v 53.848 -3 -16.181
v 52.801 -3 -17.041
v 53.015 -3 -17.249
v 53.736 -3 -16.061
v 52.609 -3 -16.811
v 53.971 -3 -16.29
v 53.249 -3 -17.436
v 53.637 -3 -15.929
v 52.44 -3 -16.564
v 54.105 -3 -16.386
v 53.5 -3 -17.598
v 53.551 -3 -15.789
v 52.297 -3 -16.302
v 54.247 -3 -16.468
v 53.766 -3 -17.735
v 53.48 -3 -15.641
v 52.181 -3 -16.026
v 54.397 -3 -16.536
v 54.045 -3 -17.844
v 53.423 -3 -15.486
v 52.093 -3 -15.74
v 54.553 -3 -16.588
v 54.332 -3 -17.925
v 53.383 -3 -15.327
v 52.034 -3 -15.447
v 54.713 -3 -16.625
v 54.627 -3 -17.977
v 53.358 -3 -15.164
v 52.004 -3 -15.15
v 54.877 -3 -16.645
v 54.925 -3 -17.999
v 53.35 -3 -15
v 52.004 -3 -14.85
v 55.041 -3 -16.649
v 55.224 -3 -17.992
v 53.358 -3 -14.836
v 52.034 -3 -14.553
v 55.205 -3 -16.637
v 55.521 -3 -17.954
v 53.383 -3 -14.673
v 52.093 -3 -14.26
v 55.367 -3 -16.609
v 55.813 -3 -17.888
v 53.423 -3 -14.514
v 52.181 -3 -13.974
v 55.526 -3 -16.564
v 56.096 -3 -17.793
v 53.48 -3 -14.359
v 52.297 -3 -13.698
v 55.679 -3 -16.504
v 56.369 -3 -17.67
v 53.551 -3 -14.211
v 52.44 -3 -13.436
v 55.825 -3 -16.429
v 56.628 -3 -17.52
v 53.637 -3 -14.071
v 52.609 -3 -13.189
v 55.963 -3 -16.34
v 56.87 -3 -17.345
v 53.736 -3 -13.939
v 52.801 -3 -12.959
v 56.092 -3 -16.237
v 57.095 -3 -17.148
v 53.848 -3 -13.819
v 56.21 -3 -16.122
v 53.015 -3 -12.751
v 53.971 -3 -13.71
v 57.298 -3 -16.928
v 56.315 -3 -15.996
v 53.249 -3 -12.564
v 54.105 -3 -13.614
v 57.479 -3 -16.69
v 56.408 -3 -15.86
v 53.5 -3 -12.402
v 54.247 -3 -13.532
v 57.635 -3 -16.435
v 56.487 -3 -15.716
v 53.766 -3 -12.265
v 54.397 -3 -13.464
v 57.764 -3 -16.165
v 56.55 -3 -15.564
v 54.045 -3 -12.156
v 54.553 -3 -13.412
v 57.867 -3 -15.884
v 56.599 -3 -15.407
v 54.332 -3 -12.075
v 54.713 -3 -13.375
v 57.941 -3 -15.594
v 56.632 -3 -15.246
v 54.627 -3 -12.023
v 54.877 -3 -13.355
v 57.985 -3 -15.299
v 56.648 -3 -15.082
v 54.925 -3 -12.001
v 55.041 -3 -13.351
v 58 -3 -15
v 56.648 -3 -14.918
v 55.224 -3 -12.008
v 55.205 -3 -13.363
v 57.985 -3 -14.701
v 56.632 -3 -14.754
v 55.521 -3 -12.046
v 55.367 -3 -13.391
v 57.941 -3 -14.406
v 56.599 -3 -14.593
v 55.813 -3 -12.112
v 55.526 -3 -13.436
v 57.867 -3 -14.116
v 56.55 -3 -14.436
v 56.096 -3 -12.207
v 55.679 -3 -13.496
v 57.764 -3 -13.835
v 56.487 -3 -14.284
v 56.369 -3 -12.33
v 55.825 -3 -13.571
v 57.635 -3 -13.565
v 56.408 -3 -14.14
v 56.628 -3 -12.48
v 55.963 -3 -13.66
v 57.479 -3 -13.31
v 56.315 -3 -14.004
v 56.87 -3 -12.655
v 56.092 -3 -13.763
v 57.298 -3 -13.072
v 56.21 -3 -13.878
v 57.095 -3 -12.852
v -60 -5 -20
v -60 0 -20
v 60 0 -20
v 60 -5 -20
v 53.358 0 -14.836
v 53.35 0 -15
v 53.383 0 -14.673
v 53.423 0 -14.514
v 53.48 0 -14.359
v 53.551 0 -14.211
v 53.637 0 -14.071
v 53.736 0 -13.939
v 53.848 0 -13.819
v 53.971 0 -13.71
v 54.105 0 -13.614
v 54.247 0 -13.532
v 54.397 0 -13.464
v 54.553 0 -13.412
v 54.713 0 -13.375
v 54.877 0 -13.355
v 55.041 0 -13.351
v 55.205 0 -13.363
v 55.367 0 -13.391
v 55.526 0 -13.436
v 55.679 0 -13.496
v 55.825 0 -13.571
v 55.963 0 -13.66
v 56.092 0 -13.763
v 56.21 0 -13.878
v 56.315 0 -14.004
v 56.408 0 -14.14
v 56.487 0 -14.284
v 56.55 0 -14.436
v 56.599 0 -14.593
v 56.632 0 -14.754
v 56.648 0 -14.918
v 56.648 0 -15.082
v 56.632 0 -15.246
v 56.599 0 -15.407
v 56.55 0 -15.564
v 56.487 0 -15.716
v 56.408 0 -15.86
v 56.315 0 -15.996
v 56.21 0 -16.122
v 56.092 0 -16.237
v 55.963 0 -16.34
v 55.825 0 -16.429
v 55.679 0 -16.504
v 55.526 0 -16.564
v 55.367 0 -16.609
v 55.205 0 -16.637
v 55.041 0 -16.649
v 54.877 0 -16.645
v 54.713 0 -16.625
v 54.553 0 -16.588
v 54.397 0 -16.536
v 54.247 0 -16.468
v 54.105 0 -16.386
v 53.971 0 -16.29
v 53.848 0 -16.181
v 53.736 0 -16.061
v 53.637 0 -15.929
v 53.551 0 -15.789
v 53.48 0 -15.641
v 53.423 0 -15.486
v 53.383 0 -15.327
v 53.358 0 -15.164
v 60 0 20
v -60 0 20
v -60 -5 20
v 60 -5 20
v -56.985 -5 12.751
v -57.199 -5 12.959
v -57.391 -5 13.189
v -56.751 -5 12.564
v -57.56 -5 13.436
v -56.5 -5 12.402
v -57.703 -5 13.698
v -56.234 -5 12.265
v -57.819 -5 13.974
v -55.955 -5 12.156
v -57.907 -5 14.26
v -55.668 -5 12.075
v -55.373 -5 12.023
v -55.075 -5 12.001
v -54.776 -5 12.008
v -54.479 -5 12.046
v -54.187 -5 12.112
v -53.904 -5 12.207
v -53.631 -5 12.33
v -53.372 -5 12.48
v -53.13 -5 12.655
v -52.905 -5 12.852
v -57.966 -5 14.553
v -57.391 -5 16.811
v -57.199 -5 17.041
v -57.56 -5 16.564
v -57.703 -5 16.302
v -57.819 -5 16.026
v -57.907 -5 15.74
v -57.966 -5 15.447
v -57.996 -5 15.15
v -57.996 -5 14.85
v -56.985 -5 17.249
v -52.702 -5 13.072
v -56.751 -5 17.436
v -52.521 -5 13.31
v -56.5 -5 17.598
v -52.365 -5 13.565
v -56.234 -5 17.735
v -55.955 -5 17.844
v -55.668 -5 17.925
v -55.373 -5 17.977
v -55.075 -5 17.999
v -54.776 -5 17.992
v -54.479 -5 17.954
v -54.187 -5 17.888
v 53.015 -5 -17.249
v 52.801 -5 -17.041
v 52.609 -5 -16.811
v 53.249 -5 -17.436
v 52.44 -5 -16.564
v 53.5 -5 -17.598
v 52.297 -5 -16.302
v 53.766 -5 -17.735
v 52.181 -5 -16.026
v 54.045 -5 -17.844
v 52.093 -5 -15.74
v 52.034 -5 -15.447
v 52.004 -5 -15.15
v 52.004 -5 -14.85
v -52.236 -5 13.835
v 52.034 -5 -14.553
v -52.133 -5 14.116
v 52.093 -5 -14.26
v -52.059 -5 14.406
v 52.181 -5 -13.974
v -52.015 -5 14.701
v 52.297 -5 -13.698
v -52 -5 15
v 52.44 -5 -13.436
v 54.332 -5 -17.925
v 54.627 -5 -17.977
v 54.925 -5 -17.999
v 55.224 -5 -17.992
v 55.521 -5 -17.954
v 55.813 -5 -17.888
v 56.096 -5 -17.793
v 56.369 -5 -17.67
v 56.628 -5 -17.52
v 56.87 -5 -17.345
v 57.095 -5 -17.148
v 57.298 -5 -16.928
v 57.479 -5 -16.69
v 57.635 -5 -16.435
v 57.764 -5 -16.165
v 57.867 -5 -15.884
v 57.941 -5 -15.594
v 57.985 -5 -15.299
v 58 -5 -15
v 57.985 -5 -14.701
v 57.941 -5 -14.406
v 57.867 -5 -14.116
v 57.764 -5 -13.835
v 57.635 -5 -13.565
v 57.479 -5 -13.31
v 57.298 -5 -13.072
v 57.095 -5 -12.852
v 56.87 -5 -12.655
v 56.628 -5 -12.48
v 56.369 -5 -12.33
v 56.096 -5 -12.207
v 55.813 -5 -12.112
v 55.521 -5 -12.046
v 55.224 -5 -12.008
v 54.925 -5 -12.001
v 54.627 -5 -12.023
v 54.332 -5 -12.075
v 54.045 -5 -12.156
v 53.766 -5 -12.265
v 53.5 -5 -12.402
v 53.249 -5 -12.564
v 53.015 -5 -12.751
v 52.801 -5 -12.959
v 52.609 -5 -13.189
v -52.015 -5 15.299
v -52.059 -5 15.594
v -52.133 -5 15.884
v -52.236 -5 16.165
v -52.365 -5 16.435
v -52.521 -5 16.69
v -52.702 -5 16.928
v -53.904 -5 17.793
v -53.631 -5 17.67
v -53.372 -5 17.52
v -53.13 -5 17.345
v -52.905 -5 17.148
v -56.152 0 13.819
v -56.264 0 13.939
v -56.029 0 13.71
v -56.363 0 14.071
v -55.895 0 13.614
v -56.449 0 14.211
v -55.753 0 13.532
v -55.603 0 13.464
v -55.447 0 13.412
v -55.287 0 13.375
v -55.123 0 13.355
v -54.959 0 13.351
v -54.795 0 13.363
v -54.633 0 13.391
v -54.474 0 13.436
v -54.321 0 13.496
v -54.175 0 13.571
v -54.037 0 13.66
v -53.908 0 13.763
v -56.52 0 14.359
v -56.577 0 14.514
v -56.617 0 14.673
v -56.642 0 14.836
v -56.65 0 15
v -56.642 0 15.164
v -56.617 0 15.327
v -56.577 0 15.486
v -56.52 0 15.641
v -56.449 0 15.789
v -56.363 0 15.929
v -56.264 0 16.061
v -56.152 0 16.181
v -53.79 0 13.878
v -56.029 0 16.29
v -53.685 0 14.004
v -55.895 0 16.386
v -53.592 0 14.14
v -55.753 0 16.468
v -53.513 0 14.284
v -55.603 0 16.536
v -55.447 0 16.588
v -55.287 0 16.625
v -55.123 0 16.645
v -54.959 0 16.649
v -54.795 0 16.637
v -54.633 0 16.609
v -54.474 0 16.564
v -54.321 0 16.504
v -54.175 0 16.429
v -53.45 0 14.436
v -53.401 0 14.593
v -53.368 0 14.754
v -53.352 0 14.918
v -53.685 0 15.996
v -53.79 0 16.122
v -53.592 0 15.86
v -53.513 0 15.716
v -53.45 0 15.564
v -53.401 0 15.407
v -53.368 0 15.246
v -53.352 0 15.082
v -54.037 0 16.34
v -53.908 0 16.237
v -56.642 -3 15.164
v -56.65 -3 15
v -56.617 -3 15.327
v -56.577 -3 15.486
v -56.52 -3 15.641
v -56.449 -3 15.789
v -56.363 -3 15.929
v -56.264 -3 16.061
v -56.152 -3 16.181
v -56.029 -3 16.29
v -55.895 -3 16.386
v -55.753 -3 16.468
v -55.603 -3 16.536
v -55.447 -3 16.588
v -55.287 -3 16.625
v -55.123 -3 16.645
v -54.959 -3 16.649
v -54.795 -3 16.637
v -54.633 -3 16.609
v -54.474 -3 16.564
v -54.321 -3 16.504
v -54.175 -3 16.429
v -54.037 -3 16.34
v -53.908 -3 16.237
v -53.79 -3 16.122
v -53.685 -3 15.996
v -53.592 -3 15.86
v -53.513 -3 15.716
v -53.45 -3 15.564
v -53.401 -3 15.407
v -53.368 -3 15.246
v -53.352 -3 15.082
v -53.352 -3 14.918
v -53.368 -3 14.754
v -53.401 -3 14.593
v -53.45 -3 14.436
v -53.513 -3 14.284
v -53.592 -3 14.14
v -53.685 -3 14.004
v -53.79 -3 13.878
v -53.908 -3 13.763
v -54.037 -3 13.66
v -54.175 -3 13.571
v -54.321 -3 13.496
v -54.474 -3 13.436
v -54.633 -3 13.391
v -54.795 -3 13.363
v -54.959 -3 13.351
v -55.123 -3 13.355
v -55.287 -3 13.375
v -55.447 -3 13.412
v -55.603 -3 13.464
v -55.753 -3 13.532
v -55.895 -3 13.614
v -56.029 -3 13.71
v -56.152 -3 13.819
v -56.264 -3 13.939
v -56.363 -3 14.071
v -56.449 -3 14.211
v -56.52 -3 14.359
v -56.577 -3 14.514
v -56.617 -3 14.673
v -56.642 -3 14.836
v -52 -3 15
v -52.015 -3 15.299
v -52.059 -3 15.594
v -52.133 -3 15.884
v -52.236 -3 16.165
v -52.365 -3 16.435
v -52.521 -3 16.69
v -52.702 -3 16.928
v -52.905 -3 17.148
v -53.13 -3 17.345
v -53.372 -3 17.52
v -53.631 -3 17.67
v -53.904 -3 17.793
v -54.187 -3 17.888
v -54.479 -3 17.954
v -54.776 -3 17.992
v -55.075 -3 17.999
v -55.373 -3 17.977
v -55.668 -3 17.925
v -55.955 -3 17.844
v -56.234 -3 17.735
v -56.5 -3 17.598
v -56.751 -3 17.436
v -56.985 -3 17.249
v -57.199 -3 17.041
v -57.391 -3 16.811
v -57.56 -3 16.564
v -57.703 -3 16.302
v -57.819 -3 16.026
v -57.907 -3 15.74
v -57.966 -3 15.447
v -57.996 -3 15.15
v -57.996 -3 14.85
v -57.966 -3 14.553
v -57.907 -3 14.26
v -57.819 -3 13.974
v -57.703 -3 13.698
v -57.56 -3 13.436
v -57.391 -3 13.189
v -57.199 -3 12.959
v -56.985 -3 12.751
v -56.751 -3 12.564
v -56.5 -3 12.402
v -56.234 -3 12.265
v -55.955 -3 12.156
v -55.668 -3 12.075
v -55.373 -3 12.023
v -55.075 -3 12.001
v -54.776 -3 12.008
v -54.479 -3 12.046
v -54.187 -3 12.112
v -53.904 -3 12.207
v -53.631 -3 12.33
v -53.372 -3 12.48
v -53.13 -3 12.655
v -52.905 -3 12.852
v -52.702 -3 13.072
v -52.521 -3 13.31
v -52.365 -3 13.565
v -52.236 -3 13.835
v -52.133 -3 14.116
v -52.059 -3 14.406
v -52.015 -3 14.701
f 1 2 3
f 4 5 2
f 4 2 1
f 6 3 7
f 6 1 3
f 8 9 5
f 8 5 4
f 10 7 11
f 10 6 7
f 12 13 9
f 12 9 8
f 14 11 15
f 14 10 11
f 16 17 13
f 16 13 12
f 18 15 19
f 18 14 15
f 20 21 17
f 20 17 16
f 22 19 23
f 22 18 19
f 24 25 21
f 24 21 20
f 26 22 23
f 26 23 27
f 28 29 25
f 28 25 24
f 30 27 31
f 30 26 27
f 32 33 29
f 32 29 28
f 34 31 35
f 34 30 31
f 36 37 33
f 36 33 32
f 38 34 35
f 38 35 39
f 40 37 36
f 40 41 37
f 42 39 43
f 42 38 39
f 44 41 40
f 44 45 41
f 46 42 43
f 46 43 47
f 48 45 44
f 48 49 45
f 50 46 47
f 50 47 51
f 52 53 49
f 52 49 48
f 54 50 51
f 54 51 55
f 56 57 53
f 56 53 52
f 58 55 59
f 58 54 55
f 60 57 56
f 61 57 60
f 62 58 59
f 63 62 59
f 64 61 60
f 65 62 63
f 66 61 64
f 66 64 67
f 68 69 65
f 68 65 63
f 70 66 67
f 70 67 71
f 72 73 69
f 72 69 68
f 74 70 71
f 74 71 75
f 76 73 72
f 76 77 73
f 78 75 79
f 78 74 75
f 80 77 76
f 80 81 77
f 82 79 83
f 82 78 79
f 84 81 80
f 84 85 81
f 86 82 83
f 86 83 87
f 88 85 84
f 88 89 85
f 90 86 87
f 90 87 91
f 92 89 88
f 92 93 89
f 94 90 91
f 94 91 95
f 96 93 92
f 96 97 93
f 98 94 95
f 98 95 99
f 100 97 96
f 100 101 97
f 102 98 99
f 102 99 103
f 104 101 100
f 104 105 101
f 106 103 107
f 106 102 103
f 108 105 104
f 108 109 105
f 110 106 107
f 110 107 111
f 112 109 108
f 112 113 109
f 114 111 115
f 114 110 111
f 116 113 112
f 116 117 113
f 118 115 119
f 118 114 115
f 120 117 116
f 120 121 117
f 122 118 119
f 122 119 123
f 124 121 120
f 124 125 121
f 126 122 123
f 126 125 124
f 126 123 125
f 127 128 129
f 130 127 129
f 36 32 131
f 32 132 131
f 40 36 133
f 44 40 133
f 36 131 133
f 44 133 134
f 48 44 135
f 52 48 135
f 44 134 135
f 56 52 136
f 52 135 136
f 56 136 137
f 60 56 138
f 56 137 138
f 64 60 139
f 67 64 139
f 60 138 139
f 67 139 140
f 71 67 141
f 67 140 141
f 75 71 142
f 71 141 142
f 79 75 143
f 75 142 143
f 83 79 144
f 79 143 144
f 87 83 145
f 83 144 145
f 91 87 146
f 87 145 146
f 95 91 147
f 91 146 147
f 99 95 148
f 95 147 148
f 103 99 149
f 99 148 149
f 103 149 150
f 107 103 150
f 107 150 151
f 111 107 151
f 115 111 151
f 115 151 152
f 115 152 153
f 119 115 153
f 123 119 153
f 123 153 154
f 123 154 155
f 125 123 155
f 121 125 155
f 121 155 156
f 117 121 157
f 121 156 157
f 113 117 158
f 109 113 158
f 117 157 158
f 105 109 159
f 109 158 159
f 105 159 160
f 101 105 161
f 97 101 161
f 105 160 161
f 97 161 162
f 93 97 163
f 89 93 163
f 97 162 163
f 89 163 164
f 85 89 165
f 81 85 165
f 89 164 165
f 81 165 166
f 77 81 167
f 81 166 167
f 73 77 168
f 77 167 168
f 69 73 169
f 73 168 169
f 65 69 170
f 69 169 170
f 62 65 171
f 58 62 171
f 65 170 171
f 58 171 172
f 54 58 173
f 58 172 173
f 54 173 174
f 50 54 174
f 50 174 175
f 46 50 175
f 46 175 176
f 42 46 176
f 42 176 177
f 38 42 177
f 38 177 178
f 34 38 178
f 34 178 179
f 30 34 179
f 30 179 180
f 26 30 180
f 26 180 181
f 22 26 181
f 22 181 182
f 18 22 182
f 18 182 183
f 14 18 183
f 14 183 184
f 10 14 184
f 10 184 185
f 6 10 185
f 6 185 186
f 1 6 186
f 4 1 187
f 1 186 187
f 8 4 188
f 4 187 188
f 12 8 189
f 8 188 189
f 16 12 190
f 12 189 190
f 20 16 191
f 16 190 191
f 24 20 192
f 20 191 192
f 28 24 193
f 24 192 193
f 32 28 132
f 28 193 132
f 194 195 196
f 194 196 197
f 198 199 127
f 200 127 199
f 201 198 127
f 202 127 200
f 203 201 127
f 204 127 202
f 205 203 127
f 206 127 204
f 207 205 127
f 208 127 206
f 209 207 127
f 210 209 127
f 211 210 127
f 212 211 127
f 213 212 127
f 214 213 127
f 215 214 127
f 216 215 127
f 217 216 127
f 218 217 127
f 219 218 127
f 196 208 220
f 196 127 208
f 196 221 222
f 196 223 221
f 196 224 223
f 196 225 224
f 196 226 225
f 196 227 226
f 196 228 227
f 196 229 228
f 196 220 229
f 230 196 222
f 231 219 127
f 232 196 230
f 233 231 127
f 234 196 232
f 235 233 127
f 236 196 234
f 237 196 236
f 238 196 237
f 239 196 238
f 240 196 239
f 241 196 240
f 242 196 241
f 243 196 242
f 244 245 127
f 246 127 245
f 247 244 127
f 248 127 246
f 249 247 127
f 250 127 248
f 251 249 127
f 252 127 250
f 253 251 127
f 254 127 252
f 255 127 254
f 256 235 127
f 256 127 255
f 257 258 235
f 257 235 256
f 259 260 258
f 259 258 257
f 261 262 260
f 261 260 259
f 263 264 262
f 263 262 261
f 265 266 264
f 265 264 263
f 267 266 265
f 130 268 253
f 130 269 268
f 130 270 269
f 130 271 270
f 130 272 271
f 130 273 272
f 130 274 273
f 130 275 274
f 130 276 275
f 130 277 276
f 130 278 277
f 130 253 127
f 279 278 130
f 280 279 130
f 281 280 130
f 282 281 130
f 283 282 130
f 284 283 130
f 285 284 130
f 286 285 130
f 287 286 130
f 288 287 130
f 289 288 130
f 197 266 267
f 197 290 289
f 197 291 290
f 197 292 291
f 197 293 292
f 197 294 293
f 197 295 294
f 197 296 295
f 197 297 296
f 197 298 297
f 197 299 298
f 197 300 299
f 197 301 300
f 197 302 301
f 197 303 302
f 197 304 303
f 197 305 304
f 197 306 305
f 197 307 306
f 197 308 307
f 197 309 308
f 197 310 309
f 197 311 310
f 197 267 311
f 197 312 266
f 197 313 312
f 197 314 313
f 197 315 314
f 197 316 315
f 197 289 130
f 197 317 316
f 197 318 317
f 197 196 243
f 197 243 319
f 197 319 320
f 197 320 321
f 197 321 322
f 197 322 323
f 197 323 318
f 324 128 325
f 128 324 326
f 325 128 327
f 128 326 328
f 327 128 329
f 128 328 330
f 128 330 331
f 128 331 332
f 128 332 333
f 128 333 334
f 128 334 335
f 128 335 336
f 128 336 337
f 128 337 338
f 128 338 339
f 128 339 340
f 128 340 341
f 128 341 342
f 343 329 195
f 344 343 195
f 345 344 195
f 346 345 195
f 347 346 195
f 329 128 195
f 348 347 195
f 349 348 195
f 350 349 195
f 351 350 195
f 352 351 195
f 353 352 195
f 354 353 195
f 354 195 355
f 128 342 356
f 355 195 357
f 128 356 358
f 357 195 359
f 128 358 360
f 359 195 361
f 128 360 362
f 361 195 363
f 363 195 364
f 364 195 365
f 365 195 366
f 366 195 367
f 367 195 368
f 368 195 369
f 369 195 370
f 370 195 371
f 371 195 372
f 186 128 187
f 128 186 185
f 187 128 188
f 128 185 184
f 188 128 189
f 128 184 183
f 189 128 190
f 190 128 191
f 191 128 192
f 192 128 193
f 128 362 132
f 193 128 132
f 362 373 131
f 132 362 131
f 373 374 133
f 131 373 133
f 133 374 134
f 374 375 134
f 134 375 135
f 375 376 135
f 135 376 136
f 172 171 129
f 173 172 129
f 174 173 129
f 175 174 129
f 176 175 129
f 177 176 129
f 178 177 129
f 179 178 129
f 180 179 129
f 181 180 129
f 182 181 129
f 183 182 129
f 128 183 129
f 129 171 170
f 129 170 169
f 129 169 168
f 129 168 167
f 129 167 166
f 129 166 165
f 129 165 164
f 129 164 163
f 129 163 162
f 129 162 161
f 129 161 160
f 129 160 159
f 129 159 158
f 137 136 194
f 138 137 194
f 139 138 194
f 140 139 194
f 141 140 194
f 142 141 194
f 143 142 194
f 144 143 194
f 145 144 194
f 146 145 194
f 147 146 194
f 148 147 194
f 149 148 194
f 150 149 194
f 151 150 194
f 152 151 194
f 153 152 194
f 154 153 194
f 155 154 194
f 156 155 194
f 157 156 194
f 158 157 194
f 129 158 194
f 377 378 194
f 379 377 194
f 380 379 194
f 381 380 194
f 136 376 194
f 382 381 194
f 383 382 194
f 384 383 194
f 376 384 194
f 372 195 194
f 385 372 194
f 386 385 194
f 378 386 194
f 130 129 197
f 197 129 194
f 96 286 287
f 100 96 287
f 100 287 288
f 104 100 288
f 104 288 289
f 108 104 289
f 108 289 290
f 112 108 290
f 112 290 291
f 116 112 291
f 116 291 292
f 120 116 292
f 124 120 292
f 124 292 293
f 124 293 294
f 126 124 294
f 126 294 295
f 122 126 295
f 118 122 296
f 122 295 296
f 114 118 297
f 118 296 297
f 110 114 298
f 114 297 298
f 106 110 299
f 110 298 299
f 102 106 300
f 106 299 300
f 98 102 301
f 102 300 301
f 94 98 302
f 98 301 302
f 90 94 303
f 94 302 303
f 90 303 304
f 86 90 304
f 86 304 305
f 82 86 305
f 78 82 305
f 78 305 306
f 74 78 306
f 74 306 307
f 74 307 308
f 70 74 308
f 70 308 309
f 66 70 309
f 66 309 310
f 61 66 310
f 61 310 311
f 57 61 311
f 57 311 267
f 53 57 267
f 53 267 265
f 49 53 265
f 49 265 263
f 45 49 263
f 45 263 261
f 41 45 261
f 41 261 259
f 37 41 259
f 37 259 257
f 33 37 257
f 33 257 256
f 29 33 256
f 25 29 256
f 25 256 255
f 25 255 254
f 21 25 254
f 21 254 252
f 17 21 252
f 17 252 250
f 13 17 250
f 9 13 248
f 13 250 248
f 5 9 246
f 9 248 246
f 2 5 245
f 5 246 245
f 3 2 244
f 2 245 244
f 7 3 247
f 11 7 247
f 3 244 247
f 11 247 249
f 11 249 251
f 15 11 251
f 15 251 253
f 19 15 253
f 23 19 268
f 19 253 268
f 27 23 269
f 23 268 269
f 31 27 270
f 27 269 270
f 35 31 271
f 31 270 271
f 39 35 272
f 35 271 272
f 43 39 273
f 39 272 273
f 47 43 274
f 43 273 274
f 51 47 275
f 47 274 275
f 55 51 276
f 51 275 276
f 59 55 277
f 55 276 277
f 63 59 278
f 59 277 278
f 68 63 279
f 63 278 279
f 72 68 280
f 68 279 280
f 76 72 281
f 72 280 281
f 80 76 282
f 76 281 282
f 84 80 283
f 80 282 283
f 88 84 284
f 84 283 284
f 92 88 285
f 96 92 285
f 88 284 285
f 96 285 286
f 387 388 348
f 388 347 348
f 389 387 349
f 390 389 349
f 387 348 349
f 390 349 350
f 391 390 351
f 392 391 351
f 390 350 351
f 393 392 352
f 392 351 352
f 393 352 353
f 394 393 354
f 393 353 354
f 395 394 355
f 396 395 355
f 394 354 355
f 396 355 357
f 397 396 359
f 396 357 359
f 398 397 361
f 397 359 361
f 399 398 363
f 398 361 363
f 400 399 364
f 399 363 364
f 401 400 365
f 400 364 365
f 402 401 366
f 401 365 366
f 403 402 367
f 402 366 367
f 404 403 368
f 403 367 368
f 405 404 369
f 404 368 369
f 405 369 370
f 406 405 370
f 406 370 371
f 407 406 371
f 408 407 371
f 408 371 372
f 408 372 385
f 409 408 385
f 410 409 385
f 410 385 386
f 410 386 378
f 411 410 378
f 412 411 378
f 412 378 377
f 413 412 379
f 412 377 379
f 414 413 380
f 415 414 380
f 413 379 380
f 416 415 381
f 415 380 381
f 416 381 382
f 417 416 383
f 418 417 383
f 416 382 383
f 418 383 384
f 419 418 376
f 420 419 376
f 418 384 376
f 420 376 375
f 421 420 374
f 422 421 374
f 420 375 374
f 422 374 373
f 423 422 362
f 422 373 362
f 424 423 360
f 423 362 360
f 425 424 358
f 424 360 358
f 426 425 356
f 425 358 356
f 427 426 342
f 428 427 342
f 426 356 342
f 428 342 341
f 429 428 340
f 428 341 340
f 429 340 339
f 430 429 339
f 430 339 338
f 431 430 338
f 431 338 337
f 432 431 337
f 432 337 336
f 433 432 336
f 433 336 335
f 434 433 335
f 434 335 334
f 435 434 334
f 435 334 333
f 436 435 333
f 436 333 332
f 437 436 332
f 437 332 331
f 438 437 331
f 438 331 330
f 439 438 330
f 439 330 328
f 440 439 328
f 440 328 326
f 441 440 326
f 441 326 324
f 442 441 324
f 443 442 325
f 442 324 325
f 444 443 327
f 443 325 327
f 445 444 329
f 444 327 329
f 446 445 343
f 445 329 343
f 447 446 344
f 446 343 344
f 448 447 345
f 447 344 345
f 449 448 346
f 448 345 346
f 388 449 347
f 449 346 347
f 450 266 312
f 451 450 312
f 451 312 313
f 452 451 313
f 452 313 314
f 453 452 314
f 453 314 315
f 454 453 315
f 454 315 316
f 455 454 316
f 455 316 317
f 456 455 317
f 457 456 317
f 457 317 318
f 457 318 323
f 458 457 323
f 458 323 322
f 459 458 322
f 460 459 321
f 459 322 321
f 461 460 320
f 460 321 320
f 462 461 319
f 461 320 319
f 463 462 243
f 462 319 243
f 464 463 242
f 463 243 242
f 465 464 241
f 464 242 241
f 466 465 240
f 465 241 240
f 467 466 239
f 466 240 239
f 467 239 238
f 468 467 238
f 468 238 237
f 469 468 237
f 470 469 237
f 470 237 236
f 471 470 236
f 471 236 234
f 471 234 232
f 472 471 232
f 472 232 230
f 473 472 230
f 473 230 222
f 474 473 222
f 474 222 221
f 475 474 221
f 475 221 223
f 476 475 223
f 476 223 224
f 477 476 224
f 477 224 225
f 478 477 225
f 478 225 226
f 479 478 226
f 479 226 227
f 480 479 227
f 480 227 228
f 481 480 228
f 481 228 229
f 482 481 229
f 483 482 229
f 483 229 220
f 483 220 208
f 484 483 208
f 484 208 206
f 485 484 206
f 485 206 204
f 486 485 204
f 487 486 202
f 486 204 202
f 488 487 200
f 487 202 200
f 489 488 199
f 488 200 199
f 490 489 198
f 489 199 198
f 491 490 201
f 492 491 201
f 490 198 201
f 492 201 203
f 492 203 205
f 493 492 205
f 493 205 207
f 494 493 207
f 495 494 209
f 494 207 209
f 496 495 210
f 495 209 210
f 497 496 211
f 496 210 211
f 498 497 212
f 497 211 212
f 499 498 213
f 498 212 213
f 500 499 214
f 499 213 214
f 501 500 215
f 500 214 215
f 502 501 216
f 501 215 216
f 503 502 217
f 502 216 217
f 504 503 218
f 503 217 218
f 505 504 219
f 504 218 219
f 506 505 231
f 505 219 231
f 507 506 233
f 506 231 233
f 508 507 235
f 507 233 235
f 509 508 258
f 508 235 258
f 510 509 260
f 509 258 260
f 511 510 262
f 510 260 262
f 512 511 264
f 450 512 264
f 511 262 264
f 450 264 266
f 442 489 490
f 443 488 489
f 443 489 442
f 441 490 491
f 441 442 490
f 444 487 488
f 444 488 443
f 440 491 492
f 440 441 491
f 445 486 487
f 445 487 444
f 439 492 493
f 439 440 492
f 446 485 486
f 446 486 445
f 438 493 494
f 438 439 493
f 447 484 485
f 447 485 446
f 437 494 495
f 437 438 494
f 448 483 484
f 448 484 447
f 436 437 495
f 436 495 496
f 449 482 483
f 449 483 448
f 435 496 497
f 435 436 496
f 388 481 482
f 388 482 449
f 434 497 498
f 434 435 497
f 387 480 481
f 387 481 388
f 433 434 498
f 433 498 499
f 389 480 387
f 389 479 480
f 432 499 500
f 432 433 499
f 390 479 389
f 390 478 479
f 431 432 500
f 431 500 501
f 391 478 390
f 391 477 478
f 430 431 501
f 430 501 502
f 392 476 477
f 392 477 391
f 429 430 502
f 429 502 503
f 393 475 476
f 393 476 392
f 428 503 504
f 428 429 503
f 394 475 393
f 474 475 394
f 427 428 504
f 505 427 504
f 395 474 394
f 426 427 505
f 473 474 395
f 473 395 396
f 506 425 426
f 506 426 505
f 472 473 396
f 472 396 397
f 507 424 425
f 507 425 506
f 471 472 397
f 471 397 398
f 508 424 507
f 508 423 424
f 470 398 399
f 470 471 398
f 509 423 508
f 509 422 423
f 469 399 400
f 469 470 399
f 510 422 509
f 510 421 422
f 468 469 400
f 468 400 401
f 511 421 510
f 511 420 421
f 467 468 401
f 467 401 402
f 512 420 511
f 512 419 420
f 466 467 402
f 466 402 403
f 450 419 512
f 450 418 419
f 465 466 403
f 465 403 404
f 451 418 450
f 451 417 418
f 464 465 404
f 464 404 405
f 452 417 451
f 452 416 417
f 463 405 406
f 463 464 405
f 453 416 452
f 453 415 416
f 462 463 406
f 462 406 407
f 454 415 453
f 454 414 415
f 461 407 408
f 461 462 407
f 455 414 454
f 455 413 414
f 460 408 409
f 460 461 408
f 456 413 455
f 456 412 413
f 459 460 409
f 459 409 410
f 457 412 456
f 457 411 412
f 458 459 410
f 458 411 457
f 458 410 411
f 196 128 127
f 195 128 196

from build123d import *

# Parameters (mm, degrees)
F0_W           = 120
F0_H           = 40
F1_DEPTH       = 5
F3_D           = 3.3
F3_CBORE_D     = 6
F3_CBORE_DEPTH = 2


with BuildPart() as f1:
    # F0 (on Front) → F1 (new body)
    with BuildSketch(Plane.XZ):
        Rectangle(F0_W, F0_H)
    extrude(amount=F1_DEPTH)

    # F3 (through all)
    with Locations(Plane.XZ.offset(5)):
        with Locations((-55, 15), (55, -15)):
            CounterBoreHole(F3_D / 2, F3_CBORE_D / 2, F3_CBORE_DEPTH)


solid = f1.part
